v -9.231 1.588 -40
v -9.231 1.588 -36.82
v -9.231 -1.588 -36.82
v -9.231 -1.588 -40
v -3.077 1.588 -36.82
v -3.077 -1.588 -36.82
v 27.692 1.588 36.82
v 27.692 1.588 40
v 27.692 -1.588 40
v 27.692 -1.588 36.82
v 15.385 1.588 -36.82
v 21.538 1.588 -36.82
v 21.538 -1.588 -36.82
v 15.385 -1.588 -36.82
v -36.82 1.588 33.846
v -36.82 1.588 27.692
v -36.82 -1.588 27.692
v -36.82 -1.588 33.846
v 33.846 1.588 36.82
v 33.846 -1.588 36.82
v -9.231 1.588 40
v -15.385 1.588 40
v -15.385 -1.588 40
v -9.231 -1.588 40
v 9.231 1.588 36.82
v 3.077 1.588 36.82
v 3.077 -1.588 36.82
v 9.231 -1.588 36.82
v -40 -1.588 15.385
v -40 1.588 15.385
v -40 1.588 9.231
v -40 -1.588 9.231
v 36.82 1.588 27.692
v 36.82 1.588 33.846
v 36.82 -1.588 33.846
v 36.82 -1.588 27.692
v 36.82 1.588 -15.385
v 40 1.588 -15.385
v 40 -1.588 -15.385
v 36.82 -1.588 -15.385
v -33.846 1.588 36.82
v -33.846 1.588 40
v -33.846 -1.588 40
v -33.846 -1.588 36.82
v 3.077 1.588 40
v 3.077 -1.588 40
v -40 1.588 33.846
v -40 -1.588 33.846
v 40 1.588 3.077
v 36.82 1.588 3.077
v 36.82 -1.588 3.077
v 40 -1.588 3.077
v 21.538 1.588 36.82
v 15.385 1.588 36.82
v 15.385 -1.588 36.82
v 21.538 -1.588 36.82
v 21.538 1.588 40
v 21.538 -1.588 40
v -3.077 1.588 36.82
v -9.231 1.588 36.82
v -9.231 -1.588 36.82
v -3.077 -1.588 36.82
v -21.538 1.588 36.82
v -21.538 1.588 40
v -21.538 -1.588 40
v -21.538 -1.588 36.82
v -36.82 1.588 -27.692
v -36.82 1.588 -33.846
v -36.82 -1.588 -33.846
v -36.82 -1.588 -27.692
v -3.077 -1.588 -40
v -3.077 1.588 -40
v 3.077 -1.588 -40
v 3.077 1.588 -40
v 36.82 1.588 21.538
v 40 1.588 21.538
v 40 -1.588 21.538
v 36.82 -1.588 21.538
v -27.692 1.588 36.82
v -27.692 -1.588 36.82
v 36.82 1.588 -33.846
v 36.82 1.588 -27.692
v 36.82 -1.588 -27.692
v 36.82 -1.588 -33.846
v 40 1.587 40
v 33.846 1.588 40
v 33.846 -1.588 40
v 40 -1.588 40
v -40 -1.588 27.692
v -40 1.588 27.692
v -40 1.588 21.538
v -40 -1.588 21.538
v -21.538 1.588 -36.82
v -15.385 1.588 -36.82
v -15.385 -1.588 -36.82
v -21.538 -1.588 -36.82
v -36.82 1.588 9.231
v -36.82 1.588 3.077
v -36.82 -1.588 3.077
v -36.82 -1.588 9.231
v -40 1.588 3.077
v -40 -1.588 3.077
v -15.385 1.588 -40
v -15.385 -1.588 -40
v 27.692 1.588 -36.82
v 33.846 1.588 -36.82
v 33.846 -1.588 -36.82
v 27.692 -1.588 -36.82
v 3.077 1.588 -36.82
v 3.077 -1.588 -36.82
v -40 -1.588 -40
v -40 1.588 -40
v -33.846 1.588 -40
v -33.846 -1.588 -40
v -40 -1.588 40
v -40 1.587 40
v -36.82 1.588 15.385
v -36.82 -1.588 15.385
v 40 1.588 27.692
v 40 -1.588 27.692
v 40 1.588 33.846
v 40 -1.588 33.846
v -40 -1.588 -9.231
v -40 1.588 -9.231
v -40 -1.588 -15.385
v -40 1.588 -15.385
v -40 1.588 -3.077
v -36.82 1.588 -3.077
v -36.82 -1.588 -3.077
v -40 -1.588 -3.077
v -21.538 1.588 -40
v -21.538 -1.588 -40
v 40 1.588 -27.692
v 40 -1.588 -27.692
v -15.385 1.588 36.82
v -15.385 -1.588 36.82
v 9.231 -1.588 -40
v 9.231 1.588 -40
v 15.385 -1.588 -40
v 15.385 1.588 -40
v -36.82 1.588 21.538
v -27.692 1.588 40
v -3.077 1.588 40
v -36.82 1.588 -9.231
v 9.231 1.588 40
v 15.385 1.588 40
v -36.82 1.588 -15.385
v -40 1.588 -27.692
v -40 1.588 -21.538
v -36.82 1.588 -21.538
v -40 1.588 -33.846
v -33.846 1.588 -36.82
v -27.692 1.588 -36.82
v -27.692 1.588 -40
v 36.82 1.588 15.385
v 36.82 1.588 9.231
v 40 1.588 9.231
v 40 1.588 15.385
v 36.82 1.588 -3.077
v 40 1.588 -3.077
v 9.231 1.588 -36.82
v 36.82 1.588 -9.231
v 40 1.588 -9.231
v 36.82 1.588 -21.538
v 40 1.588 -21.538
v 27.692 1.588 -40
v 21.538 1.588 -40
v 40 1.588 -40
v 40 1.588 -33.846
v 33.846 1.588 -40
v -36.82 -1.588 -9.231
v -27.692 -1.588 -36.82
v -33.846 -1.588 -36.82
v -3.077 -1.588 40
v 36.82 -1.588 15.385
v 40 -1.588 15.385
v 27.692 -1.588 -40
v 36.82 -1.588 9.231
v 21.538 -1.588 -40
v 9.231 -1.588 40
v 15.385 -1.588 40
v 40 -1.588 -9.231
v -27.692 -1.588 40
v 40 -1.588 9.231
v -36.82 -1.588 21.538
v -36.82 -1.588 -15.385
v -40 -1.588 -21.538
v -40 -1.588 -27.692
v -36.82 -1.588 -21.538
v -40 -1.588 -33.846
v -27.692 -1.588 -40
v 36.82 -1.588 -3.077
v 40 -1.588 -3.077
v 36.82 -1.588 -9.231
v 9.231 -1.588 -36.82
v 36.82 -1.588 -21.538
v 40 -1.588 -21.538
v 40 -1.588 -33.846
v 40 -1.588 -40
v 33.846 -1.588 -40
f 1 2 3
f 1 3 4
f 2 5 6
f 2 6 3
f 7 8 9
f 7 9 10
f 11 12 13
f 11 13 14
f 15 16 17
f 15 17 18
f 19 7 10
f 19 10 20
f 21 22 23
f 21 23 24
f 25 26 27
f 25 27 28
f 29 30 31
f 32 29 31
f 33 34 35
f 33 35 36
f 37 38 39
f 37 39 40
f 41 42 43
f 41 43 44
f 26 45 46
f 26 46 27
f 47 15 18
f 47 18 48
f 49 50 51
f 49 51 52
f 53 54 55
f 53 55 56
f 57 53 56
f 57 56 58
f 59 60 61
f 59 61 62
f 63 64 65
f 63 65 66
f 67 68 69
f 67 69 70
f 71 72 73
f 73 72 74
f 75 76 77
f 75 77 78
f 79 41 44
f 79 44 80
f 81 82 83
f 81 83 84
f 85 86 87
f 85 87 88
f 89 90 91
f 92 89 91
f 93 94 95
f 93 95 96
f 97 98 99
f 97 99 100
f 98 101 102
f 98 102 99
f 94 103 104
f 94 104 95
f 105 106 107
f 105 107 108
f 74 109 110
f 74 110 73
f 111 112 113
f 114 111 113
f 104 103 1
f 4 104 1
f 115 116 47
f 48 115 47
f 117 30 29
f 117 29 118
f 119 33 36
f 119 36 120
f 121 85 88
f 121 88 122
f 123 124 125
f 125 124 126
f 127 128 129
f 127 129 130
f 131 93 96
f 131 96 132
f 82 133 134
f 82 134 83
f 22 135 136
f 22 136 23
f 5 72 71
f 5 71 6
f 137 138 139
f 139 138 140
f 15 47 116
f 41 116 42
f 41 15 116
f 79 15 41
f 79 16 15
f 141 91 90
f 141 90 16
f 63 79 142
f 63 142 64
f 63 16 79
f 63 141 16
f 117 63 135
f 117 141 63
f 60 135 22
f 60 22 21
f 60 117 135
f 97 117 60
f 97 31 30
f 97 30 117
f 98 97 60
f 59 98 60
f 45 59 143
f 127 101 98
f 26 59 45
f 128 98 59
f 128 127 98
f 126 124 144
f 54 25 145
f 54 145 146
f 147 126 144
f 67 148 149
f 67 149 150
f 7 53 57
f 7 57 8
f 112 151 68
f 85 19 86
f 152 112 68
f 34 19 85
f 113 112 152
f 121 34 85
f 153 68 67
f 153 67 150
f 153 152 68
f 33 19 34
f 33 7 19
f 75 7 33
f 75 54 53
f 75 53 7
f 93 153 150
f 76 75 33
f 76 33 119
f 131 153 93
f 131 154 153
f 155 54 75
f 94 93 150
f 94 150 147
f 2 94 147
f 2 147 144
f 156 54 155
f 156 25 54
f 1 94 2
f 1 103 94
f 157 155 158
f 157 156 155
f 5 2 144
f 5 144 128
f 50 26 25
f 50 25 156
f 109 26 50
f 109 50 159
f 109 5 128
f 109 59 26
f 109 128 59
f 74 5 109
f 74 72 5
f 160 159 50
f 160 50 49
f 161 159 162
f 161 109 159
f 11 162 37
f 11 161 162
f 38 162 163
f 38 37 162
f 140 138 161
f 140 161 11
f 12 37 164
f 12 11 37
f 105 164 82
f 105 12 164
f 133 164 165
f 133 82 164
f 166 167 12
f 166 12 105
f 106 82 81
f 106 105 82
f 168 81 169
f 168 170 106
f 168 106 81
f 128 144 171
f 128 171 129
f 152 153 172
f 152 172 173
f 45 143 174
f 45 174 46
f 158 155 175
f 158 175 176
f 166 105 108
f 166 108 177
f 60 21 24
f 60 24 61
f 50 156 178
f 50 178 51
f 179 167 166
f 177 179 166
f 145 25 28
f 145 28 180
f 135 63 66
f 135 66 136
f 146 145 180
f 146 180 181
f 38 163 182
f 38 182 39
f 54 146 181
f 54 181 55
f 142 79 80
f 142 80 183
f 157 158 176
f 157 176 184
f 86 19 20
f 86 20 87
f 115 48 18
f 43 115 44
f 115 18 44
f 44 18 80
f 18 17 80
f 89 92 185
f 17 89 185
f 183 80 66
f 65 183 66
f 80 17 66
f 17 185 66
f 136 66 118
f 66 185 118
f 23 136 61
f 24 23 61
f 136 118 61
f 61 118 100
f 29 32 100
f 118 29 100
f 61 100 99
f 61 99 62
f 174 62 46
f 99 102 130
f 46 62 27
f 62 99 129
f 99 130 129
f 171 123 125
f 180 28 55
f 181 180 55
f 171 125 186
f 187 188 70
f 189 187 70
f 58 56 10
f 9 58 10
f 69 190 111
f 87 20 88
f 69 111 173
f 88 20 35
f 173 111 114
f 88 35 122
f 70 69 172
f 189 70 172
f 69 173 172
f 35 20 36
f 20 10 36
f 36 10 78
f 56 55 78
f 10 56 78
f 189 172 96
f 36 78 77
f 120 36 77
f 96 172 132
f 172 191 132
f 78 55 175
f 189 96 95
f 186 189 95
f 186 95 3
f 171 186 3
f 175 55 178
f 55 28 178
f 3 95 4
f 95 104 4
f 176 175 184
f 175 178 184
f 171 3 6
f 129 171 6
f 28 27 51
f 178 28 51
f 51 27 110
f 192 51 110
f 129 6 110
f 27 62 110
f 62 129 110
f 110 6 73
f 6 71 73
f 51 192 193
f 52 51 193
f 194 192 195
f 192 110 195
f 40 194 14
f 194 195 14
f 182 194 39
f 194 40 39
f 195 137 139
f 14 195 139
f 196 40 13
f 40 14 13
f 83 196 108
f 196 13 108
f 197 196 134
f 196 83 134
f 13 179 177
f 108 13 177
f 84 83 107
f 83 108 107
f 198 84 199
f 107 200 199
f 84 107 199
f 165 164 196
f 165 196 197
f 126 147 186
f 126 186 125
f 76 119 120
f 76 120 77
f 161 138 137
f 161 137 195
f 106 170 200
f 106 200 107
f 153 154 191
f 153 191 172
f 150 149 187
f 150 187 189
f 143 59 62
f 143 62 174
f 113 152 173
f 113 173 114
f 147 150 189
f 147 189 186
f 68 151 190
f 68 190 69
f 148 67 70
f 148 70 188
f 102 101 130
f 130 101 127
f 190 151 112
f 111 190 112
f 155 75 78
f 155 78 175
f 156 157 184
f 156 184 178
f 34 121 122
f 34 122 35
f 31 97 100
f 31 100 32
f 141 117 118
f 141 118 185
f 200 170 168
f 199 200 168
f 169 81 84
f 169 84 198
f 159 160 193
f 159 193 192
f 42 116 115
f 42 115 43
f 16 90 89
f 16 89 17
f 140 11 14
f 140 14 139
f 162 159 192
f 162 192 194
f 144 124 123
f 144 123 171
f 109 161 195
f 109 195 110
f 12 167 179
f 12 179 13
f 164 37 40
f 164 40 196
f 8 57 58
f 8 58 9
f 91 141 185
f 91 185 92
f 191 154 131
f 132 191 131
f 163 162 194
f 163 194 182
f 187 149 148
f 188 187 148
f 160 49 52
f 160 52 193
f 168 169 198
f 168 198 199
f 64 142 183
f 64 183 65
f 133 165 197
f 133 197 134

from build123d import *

# Parameters (mm, degrees)
SKETCH1_W           = 80
SKETCH1_H           = 80
BOSS_EXTRUDE1_DEPTH = 1.5875
SKETCH2_OUTSIDE_W   = 104.636
SKETCH2_OUTSIDE_H   = 104.636
CUT_EXTRUDE1_DEPTH  = 57.657573413


with BuildPart() as part:
    # Sketch1 → Boss-Extrude1 (new, symmetric)
    with BuildSketch(Plane(origin=(0, 0, 0), x_dir=(1, 0, 0), z_dir=(0, 1, 0))):
        Rectangle(SKETCH1_W, SKETCH1_H)
    extrude(amount=BOSS_EXTRUDE1_DEPTH, both=True)

    # Sketch2 outside → Cut-Extrude1 (cut, through all)
    with BuildSketch(Plane(origin=(0, 1.5875, 0), x_dir=(1, 0, 0), z_dir=(0, 1, 0))):
        Rectangle(SKETCH2_OUTSIDE_W, SKETCH2_OUTSIDE_H)
        Polygon((-40, 40), (-40, 33.846153846), (-36.82, 33.846153846), (-36.82, 27.692307692), (-40, 27.692307692), (-40, 21.538461538), (-36.82, 21.538461538), (-36.82, 15.384615385), (-40, 15.384615385), (-40, 9.230769231), (-36.82, 9.230769231), (-36.82, 3.076923077), (-40, 3.076923077), (-40, -3.076923077), (-36.82, -3.076923077), (-36.82, -9.230769231), (-40, -9.230769231), (-40, -15.384615385), (-36.82, -15.384615385), (-36.82, -21.538461538), (-40, -21.538461538), (-40, -27.692307692), (-36.82, -27.692307692), (-36.82, -33.846153846), (-40, -33.846153846), (-40, -40), (-33.846153846, -40), (-33.846153846, -36.82), (-27.692307692, -36.82), (-27.692307692, -40), (-21.538461538, -40), (-21.538461538, -36.82), (-15.384615385, -36.82), (-15.384615385, -40), (-9.230769231, -40), (-9.230769231, -36.82), (-3.076923077, -36.82), (-3.076923077, -40), (3.076923077, -40), (3.076923077, -36.82), (9.230769231, -36.82), (9.230769231, -40), (15.384615385, -40), (15.384615385, -36.82), (21.538461538, -36.82), (21.538461538, -40), (27.692307692, -40), (27.692307692, -36.82), (33.846153846, -36.82), (33.846153846, -40), (40, -40), (40, -33.846153846), (36.82, -33.846153846), (36.82, -27.692307692), (40, -27.692307692), (40, -21.538461538), (36.82, -21.538461538), (36.82, -15.384615385), (40, -15.384615385), (40, -9.230769231), (36.82, -9.230769231), (36.82, -3.076923077), (40, -3.076923077), (40, 3.076923077), (36.82, 3.076923077), (36.82, 9.230769231), (40, 9.230769231), (40, 15.384615385), (36.82, 15.384615385), (36.82, 21.538461538), (40, 21.538461538), (40, 27.692307692), (36.82, 27.692307692), (36.82, 33.846153846), (40, 33.846153846), (40, 40), (33.846153846, 40), (33.846153846, 36.82), (27.692307692, 36.82), (27.692307692, 40), (21.538461538, 40), (21.538461538, 36.82), (15.384615385, 36.82), (15.384615385, 40), (9.230769231, 40), (9.230769231, 36.82), (3.076923077, 36.82), (3.076923077, 40), (-3.076923077, 40), (-3.076923077, 36.82), (-9.230769231, 36.82), (-9.230769231, 40), (-15.384615385, 40), (-15.384615385, 36.82), (-21.538461538, 36.82), (-21.538461538, 40), (-27.692307692, 40), (-27.692307692, 36.82), (-33.846153846, 36.82), (-33.846153846, 40), align=None, mode=Mode.SUBTRACT)
    extrude(amount=-CUT_EXTRUDE1_DEPTH, mode=Mode.SUBTRACT)


solid = part.part
